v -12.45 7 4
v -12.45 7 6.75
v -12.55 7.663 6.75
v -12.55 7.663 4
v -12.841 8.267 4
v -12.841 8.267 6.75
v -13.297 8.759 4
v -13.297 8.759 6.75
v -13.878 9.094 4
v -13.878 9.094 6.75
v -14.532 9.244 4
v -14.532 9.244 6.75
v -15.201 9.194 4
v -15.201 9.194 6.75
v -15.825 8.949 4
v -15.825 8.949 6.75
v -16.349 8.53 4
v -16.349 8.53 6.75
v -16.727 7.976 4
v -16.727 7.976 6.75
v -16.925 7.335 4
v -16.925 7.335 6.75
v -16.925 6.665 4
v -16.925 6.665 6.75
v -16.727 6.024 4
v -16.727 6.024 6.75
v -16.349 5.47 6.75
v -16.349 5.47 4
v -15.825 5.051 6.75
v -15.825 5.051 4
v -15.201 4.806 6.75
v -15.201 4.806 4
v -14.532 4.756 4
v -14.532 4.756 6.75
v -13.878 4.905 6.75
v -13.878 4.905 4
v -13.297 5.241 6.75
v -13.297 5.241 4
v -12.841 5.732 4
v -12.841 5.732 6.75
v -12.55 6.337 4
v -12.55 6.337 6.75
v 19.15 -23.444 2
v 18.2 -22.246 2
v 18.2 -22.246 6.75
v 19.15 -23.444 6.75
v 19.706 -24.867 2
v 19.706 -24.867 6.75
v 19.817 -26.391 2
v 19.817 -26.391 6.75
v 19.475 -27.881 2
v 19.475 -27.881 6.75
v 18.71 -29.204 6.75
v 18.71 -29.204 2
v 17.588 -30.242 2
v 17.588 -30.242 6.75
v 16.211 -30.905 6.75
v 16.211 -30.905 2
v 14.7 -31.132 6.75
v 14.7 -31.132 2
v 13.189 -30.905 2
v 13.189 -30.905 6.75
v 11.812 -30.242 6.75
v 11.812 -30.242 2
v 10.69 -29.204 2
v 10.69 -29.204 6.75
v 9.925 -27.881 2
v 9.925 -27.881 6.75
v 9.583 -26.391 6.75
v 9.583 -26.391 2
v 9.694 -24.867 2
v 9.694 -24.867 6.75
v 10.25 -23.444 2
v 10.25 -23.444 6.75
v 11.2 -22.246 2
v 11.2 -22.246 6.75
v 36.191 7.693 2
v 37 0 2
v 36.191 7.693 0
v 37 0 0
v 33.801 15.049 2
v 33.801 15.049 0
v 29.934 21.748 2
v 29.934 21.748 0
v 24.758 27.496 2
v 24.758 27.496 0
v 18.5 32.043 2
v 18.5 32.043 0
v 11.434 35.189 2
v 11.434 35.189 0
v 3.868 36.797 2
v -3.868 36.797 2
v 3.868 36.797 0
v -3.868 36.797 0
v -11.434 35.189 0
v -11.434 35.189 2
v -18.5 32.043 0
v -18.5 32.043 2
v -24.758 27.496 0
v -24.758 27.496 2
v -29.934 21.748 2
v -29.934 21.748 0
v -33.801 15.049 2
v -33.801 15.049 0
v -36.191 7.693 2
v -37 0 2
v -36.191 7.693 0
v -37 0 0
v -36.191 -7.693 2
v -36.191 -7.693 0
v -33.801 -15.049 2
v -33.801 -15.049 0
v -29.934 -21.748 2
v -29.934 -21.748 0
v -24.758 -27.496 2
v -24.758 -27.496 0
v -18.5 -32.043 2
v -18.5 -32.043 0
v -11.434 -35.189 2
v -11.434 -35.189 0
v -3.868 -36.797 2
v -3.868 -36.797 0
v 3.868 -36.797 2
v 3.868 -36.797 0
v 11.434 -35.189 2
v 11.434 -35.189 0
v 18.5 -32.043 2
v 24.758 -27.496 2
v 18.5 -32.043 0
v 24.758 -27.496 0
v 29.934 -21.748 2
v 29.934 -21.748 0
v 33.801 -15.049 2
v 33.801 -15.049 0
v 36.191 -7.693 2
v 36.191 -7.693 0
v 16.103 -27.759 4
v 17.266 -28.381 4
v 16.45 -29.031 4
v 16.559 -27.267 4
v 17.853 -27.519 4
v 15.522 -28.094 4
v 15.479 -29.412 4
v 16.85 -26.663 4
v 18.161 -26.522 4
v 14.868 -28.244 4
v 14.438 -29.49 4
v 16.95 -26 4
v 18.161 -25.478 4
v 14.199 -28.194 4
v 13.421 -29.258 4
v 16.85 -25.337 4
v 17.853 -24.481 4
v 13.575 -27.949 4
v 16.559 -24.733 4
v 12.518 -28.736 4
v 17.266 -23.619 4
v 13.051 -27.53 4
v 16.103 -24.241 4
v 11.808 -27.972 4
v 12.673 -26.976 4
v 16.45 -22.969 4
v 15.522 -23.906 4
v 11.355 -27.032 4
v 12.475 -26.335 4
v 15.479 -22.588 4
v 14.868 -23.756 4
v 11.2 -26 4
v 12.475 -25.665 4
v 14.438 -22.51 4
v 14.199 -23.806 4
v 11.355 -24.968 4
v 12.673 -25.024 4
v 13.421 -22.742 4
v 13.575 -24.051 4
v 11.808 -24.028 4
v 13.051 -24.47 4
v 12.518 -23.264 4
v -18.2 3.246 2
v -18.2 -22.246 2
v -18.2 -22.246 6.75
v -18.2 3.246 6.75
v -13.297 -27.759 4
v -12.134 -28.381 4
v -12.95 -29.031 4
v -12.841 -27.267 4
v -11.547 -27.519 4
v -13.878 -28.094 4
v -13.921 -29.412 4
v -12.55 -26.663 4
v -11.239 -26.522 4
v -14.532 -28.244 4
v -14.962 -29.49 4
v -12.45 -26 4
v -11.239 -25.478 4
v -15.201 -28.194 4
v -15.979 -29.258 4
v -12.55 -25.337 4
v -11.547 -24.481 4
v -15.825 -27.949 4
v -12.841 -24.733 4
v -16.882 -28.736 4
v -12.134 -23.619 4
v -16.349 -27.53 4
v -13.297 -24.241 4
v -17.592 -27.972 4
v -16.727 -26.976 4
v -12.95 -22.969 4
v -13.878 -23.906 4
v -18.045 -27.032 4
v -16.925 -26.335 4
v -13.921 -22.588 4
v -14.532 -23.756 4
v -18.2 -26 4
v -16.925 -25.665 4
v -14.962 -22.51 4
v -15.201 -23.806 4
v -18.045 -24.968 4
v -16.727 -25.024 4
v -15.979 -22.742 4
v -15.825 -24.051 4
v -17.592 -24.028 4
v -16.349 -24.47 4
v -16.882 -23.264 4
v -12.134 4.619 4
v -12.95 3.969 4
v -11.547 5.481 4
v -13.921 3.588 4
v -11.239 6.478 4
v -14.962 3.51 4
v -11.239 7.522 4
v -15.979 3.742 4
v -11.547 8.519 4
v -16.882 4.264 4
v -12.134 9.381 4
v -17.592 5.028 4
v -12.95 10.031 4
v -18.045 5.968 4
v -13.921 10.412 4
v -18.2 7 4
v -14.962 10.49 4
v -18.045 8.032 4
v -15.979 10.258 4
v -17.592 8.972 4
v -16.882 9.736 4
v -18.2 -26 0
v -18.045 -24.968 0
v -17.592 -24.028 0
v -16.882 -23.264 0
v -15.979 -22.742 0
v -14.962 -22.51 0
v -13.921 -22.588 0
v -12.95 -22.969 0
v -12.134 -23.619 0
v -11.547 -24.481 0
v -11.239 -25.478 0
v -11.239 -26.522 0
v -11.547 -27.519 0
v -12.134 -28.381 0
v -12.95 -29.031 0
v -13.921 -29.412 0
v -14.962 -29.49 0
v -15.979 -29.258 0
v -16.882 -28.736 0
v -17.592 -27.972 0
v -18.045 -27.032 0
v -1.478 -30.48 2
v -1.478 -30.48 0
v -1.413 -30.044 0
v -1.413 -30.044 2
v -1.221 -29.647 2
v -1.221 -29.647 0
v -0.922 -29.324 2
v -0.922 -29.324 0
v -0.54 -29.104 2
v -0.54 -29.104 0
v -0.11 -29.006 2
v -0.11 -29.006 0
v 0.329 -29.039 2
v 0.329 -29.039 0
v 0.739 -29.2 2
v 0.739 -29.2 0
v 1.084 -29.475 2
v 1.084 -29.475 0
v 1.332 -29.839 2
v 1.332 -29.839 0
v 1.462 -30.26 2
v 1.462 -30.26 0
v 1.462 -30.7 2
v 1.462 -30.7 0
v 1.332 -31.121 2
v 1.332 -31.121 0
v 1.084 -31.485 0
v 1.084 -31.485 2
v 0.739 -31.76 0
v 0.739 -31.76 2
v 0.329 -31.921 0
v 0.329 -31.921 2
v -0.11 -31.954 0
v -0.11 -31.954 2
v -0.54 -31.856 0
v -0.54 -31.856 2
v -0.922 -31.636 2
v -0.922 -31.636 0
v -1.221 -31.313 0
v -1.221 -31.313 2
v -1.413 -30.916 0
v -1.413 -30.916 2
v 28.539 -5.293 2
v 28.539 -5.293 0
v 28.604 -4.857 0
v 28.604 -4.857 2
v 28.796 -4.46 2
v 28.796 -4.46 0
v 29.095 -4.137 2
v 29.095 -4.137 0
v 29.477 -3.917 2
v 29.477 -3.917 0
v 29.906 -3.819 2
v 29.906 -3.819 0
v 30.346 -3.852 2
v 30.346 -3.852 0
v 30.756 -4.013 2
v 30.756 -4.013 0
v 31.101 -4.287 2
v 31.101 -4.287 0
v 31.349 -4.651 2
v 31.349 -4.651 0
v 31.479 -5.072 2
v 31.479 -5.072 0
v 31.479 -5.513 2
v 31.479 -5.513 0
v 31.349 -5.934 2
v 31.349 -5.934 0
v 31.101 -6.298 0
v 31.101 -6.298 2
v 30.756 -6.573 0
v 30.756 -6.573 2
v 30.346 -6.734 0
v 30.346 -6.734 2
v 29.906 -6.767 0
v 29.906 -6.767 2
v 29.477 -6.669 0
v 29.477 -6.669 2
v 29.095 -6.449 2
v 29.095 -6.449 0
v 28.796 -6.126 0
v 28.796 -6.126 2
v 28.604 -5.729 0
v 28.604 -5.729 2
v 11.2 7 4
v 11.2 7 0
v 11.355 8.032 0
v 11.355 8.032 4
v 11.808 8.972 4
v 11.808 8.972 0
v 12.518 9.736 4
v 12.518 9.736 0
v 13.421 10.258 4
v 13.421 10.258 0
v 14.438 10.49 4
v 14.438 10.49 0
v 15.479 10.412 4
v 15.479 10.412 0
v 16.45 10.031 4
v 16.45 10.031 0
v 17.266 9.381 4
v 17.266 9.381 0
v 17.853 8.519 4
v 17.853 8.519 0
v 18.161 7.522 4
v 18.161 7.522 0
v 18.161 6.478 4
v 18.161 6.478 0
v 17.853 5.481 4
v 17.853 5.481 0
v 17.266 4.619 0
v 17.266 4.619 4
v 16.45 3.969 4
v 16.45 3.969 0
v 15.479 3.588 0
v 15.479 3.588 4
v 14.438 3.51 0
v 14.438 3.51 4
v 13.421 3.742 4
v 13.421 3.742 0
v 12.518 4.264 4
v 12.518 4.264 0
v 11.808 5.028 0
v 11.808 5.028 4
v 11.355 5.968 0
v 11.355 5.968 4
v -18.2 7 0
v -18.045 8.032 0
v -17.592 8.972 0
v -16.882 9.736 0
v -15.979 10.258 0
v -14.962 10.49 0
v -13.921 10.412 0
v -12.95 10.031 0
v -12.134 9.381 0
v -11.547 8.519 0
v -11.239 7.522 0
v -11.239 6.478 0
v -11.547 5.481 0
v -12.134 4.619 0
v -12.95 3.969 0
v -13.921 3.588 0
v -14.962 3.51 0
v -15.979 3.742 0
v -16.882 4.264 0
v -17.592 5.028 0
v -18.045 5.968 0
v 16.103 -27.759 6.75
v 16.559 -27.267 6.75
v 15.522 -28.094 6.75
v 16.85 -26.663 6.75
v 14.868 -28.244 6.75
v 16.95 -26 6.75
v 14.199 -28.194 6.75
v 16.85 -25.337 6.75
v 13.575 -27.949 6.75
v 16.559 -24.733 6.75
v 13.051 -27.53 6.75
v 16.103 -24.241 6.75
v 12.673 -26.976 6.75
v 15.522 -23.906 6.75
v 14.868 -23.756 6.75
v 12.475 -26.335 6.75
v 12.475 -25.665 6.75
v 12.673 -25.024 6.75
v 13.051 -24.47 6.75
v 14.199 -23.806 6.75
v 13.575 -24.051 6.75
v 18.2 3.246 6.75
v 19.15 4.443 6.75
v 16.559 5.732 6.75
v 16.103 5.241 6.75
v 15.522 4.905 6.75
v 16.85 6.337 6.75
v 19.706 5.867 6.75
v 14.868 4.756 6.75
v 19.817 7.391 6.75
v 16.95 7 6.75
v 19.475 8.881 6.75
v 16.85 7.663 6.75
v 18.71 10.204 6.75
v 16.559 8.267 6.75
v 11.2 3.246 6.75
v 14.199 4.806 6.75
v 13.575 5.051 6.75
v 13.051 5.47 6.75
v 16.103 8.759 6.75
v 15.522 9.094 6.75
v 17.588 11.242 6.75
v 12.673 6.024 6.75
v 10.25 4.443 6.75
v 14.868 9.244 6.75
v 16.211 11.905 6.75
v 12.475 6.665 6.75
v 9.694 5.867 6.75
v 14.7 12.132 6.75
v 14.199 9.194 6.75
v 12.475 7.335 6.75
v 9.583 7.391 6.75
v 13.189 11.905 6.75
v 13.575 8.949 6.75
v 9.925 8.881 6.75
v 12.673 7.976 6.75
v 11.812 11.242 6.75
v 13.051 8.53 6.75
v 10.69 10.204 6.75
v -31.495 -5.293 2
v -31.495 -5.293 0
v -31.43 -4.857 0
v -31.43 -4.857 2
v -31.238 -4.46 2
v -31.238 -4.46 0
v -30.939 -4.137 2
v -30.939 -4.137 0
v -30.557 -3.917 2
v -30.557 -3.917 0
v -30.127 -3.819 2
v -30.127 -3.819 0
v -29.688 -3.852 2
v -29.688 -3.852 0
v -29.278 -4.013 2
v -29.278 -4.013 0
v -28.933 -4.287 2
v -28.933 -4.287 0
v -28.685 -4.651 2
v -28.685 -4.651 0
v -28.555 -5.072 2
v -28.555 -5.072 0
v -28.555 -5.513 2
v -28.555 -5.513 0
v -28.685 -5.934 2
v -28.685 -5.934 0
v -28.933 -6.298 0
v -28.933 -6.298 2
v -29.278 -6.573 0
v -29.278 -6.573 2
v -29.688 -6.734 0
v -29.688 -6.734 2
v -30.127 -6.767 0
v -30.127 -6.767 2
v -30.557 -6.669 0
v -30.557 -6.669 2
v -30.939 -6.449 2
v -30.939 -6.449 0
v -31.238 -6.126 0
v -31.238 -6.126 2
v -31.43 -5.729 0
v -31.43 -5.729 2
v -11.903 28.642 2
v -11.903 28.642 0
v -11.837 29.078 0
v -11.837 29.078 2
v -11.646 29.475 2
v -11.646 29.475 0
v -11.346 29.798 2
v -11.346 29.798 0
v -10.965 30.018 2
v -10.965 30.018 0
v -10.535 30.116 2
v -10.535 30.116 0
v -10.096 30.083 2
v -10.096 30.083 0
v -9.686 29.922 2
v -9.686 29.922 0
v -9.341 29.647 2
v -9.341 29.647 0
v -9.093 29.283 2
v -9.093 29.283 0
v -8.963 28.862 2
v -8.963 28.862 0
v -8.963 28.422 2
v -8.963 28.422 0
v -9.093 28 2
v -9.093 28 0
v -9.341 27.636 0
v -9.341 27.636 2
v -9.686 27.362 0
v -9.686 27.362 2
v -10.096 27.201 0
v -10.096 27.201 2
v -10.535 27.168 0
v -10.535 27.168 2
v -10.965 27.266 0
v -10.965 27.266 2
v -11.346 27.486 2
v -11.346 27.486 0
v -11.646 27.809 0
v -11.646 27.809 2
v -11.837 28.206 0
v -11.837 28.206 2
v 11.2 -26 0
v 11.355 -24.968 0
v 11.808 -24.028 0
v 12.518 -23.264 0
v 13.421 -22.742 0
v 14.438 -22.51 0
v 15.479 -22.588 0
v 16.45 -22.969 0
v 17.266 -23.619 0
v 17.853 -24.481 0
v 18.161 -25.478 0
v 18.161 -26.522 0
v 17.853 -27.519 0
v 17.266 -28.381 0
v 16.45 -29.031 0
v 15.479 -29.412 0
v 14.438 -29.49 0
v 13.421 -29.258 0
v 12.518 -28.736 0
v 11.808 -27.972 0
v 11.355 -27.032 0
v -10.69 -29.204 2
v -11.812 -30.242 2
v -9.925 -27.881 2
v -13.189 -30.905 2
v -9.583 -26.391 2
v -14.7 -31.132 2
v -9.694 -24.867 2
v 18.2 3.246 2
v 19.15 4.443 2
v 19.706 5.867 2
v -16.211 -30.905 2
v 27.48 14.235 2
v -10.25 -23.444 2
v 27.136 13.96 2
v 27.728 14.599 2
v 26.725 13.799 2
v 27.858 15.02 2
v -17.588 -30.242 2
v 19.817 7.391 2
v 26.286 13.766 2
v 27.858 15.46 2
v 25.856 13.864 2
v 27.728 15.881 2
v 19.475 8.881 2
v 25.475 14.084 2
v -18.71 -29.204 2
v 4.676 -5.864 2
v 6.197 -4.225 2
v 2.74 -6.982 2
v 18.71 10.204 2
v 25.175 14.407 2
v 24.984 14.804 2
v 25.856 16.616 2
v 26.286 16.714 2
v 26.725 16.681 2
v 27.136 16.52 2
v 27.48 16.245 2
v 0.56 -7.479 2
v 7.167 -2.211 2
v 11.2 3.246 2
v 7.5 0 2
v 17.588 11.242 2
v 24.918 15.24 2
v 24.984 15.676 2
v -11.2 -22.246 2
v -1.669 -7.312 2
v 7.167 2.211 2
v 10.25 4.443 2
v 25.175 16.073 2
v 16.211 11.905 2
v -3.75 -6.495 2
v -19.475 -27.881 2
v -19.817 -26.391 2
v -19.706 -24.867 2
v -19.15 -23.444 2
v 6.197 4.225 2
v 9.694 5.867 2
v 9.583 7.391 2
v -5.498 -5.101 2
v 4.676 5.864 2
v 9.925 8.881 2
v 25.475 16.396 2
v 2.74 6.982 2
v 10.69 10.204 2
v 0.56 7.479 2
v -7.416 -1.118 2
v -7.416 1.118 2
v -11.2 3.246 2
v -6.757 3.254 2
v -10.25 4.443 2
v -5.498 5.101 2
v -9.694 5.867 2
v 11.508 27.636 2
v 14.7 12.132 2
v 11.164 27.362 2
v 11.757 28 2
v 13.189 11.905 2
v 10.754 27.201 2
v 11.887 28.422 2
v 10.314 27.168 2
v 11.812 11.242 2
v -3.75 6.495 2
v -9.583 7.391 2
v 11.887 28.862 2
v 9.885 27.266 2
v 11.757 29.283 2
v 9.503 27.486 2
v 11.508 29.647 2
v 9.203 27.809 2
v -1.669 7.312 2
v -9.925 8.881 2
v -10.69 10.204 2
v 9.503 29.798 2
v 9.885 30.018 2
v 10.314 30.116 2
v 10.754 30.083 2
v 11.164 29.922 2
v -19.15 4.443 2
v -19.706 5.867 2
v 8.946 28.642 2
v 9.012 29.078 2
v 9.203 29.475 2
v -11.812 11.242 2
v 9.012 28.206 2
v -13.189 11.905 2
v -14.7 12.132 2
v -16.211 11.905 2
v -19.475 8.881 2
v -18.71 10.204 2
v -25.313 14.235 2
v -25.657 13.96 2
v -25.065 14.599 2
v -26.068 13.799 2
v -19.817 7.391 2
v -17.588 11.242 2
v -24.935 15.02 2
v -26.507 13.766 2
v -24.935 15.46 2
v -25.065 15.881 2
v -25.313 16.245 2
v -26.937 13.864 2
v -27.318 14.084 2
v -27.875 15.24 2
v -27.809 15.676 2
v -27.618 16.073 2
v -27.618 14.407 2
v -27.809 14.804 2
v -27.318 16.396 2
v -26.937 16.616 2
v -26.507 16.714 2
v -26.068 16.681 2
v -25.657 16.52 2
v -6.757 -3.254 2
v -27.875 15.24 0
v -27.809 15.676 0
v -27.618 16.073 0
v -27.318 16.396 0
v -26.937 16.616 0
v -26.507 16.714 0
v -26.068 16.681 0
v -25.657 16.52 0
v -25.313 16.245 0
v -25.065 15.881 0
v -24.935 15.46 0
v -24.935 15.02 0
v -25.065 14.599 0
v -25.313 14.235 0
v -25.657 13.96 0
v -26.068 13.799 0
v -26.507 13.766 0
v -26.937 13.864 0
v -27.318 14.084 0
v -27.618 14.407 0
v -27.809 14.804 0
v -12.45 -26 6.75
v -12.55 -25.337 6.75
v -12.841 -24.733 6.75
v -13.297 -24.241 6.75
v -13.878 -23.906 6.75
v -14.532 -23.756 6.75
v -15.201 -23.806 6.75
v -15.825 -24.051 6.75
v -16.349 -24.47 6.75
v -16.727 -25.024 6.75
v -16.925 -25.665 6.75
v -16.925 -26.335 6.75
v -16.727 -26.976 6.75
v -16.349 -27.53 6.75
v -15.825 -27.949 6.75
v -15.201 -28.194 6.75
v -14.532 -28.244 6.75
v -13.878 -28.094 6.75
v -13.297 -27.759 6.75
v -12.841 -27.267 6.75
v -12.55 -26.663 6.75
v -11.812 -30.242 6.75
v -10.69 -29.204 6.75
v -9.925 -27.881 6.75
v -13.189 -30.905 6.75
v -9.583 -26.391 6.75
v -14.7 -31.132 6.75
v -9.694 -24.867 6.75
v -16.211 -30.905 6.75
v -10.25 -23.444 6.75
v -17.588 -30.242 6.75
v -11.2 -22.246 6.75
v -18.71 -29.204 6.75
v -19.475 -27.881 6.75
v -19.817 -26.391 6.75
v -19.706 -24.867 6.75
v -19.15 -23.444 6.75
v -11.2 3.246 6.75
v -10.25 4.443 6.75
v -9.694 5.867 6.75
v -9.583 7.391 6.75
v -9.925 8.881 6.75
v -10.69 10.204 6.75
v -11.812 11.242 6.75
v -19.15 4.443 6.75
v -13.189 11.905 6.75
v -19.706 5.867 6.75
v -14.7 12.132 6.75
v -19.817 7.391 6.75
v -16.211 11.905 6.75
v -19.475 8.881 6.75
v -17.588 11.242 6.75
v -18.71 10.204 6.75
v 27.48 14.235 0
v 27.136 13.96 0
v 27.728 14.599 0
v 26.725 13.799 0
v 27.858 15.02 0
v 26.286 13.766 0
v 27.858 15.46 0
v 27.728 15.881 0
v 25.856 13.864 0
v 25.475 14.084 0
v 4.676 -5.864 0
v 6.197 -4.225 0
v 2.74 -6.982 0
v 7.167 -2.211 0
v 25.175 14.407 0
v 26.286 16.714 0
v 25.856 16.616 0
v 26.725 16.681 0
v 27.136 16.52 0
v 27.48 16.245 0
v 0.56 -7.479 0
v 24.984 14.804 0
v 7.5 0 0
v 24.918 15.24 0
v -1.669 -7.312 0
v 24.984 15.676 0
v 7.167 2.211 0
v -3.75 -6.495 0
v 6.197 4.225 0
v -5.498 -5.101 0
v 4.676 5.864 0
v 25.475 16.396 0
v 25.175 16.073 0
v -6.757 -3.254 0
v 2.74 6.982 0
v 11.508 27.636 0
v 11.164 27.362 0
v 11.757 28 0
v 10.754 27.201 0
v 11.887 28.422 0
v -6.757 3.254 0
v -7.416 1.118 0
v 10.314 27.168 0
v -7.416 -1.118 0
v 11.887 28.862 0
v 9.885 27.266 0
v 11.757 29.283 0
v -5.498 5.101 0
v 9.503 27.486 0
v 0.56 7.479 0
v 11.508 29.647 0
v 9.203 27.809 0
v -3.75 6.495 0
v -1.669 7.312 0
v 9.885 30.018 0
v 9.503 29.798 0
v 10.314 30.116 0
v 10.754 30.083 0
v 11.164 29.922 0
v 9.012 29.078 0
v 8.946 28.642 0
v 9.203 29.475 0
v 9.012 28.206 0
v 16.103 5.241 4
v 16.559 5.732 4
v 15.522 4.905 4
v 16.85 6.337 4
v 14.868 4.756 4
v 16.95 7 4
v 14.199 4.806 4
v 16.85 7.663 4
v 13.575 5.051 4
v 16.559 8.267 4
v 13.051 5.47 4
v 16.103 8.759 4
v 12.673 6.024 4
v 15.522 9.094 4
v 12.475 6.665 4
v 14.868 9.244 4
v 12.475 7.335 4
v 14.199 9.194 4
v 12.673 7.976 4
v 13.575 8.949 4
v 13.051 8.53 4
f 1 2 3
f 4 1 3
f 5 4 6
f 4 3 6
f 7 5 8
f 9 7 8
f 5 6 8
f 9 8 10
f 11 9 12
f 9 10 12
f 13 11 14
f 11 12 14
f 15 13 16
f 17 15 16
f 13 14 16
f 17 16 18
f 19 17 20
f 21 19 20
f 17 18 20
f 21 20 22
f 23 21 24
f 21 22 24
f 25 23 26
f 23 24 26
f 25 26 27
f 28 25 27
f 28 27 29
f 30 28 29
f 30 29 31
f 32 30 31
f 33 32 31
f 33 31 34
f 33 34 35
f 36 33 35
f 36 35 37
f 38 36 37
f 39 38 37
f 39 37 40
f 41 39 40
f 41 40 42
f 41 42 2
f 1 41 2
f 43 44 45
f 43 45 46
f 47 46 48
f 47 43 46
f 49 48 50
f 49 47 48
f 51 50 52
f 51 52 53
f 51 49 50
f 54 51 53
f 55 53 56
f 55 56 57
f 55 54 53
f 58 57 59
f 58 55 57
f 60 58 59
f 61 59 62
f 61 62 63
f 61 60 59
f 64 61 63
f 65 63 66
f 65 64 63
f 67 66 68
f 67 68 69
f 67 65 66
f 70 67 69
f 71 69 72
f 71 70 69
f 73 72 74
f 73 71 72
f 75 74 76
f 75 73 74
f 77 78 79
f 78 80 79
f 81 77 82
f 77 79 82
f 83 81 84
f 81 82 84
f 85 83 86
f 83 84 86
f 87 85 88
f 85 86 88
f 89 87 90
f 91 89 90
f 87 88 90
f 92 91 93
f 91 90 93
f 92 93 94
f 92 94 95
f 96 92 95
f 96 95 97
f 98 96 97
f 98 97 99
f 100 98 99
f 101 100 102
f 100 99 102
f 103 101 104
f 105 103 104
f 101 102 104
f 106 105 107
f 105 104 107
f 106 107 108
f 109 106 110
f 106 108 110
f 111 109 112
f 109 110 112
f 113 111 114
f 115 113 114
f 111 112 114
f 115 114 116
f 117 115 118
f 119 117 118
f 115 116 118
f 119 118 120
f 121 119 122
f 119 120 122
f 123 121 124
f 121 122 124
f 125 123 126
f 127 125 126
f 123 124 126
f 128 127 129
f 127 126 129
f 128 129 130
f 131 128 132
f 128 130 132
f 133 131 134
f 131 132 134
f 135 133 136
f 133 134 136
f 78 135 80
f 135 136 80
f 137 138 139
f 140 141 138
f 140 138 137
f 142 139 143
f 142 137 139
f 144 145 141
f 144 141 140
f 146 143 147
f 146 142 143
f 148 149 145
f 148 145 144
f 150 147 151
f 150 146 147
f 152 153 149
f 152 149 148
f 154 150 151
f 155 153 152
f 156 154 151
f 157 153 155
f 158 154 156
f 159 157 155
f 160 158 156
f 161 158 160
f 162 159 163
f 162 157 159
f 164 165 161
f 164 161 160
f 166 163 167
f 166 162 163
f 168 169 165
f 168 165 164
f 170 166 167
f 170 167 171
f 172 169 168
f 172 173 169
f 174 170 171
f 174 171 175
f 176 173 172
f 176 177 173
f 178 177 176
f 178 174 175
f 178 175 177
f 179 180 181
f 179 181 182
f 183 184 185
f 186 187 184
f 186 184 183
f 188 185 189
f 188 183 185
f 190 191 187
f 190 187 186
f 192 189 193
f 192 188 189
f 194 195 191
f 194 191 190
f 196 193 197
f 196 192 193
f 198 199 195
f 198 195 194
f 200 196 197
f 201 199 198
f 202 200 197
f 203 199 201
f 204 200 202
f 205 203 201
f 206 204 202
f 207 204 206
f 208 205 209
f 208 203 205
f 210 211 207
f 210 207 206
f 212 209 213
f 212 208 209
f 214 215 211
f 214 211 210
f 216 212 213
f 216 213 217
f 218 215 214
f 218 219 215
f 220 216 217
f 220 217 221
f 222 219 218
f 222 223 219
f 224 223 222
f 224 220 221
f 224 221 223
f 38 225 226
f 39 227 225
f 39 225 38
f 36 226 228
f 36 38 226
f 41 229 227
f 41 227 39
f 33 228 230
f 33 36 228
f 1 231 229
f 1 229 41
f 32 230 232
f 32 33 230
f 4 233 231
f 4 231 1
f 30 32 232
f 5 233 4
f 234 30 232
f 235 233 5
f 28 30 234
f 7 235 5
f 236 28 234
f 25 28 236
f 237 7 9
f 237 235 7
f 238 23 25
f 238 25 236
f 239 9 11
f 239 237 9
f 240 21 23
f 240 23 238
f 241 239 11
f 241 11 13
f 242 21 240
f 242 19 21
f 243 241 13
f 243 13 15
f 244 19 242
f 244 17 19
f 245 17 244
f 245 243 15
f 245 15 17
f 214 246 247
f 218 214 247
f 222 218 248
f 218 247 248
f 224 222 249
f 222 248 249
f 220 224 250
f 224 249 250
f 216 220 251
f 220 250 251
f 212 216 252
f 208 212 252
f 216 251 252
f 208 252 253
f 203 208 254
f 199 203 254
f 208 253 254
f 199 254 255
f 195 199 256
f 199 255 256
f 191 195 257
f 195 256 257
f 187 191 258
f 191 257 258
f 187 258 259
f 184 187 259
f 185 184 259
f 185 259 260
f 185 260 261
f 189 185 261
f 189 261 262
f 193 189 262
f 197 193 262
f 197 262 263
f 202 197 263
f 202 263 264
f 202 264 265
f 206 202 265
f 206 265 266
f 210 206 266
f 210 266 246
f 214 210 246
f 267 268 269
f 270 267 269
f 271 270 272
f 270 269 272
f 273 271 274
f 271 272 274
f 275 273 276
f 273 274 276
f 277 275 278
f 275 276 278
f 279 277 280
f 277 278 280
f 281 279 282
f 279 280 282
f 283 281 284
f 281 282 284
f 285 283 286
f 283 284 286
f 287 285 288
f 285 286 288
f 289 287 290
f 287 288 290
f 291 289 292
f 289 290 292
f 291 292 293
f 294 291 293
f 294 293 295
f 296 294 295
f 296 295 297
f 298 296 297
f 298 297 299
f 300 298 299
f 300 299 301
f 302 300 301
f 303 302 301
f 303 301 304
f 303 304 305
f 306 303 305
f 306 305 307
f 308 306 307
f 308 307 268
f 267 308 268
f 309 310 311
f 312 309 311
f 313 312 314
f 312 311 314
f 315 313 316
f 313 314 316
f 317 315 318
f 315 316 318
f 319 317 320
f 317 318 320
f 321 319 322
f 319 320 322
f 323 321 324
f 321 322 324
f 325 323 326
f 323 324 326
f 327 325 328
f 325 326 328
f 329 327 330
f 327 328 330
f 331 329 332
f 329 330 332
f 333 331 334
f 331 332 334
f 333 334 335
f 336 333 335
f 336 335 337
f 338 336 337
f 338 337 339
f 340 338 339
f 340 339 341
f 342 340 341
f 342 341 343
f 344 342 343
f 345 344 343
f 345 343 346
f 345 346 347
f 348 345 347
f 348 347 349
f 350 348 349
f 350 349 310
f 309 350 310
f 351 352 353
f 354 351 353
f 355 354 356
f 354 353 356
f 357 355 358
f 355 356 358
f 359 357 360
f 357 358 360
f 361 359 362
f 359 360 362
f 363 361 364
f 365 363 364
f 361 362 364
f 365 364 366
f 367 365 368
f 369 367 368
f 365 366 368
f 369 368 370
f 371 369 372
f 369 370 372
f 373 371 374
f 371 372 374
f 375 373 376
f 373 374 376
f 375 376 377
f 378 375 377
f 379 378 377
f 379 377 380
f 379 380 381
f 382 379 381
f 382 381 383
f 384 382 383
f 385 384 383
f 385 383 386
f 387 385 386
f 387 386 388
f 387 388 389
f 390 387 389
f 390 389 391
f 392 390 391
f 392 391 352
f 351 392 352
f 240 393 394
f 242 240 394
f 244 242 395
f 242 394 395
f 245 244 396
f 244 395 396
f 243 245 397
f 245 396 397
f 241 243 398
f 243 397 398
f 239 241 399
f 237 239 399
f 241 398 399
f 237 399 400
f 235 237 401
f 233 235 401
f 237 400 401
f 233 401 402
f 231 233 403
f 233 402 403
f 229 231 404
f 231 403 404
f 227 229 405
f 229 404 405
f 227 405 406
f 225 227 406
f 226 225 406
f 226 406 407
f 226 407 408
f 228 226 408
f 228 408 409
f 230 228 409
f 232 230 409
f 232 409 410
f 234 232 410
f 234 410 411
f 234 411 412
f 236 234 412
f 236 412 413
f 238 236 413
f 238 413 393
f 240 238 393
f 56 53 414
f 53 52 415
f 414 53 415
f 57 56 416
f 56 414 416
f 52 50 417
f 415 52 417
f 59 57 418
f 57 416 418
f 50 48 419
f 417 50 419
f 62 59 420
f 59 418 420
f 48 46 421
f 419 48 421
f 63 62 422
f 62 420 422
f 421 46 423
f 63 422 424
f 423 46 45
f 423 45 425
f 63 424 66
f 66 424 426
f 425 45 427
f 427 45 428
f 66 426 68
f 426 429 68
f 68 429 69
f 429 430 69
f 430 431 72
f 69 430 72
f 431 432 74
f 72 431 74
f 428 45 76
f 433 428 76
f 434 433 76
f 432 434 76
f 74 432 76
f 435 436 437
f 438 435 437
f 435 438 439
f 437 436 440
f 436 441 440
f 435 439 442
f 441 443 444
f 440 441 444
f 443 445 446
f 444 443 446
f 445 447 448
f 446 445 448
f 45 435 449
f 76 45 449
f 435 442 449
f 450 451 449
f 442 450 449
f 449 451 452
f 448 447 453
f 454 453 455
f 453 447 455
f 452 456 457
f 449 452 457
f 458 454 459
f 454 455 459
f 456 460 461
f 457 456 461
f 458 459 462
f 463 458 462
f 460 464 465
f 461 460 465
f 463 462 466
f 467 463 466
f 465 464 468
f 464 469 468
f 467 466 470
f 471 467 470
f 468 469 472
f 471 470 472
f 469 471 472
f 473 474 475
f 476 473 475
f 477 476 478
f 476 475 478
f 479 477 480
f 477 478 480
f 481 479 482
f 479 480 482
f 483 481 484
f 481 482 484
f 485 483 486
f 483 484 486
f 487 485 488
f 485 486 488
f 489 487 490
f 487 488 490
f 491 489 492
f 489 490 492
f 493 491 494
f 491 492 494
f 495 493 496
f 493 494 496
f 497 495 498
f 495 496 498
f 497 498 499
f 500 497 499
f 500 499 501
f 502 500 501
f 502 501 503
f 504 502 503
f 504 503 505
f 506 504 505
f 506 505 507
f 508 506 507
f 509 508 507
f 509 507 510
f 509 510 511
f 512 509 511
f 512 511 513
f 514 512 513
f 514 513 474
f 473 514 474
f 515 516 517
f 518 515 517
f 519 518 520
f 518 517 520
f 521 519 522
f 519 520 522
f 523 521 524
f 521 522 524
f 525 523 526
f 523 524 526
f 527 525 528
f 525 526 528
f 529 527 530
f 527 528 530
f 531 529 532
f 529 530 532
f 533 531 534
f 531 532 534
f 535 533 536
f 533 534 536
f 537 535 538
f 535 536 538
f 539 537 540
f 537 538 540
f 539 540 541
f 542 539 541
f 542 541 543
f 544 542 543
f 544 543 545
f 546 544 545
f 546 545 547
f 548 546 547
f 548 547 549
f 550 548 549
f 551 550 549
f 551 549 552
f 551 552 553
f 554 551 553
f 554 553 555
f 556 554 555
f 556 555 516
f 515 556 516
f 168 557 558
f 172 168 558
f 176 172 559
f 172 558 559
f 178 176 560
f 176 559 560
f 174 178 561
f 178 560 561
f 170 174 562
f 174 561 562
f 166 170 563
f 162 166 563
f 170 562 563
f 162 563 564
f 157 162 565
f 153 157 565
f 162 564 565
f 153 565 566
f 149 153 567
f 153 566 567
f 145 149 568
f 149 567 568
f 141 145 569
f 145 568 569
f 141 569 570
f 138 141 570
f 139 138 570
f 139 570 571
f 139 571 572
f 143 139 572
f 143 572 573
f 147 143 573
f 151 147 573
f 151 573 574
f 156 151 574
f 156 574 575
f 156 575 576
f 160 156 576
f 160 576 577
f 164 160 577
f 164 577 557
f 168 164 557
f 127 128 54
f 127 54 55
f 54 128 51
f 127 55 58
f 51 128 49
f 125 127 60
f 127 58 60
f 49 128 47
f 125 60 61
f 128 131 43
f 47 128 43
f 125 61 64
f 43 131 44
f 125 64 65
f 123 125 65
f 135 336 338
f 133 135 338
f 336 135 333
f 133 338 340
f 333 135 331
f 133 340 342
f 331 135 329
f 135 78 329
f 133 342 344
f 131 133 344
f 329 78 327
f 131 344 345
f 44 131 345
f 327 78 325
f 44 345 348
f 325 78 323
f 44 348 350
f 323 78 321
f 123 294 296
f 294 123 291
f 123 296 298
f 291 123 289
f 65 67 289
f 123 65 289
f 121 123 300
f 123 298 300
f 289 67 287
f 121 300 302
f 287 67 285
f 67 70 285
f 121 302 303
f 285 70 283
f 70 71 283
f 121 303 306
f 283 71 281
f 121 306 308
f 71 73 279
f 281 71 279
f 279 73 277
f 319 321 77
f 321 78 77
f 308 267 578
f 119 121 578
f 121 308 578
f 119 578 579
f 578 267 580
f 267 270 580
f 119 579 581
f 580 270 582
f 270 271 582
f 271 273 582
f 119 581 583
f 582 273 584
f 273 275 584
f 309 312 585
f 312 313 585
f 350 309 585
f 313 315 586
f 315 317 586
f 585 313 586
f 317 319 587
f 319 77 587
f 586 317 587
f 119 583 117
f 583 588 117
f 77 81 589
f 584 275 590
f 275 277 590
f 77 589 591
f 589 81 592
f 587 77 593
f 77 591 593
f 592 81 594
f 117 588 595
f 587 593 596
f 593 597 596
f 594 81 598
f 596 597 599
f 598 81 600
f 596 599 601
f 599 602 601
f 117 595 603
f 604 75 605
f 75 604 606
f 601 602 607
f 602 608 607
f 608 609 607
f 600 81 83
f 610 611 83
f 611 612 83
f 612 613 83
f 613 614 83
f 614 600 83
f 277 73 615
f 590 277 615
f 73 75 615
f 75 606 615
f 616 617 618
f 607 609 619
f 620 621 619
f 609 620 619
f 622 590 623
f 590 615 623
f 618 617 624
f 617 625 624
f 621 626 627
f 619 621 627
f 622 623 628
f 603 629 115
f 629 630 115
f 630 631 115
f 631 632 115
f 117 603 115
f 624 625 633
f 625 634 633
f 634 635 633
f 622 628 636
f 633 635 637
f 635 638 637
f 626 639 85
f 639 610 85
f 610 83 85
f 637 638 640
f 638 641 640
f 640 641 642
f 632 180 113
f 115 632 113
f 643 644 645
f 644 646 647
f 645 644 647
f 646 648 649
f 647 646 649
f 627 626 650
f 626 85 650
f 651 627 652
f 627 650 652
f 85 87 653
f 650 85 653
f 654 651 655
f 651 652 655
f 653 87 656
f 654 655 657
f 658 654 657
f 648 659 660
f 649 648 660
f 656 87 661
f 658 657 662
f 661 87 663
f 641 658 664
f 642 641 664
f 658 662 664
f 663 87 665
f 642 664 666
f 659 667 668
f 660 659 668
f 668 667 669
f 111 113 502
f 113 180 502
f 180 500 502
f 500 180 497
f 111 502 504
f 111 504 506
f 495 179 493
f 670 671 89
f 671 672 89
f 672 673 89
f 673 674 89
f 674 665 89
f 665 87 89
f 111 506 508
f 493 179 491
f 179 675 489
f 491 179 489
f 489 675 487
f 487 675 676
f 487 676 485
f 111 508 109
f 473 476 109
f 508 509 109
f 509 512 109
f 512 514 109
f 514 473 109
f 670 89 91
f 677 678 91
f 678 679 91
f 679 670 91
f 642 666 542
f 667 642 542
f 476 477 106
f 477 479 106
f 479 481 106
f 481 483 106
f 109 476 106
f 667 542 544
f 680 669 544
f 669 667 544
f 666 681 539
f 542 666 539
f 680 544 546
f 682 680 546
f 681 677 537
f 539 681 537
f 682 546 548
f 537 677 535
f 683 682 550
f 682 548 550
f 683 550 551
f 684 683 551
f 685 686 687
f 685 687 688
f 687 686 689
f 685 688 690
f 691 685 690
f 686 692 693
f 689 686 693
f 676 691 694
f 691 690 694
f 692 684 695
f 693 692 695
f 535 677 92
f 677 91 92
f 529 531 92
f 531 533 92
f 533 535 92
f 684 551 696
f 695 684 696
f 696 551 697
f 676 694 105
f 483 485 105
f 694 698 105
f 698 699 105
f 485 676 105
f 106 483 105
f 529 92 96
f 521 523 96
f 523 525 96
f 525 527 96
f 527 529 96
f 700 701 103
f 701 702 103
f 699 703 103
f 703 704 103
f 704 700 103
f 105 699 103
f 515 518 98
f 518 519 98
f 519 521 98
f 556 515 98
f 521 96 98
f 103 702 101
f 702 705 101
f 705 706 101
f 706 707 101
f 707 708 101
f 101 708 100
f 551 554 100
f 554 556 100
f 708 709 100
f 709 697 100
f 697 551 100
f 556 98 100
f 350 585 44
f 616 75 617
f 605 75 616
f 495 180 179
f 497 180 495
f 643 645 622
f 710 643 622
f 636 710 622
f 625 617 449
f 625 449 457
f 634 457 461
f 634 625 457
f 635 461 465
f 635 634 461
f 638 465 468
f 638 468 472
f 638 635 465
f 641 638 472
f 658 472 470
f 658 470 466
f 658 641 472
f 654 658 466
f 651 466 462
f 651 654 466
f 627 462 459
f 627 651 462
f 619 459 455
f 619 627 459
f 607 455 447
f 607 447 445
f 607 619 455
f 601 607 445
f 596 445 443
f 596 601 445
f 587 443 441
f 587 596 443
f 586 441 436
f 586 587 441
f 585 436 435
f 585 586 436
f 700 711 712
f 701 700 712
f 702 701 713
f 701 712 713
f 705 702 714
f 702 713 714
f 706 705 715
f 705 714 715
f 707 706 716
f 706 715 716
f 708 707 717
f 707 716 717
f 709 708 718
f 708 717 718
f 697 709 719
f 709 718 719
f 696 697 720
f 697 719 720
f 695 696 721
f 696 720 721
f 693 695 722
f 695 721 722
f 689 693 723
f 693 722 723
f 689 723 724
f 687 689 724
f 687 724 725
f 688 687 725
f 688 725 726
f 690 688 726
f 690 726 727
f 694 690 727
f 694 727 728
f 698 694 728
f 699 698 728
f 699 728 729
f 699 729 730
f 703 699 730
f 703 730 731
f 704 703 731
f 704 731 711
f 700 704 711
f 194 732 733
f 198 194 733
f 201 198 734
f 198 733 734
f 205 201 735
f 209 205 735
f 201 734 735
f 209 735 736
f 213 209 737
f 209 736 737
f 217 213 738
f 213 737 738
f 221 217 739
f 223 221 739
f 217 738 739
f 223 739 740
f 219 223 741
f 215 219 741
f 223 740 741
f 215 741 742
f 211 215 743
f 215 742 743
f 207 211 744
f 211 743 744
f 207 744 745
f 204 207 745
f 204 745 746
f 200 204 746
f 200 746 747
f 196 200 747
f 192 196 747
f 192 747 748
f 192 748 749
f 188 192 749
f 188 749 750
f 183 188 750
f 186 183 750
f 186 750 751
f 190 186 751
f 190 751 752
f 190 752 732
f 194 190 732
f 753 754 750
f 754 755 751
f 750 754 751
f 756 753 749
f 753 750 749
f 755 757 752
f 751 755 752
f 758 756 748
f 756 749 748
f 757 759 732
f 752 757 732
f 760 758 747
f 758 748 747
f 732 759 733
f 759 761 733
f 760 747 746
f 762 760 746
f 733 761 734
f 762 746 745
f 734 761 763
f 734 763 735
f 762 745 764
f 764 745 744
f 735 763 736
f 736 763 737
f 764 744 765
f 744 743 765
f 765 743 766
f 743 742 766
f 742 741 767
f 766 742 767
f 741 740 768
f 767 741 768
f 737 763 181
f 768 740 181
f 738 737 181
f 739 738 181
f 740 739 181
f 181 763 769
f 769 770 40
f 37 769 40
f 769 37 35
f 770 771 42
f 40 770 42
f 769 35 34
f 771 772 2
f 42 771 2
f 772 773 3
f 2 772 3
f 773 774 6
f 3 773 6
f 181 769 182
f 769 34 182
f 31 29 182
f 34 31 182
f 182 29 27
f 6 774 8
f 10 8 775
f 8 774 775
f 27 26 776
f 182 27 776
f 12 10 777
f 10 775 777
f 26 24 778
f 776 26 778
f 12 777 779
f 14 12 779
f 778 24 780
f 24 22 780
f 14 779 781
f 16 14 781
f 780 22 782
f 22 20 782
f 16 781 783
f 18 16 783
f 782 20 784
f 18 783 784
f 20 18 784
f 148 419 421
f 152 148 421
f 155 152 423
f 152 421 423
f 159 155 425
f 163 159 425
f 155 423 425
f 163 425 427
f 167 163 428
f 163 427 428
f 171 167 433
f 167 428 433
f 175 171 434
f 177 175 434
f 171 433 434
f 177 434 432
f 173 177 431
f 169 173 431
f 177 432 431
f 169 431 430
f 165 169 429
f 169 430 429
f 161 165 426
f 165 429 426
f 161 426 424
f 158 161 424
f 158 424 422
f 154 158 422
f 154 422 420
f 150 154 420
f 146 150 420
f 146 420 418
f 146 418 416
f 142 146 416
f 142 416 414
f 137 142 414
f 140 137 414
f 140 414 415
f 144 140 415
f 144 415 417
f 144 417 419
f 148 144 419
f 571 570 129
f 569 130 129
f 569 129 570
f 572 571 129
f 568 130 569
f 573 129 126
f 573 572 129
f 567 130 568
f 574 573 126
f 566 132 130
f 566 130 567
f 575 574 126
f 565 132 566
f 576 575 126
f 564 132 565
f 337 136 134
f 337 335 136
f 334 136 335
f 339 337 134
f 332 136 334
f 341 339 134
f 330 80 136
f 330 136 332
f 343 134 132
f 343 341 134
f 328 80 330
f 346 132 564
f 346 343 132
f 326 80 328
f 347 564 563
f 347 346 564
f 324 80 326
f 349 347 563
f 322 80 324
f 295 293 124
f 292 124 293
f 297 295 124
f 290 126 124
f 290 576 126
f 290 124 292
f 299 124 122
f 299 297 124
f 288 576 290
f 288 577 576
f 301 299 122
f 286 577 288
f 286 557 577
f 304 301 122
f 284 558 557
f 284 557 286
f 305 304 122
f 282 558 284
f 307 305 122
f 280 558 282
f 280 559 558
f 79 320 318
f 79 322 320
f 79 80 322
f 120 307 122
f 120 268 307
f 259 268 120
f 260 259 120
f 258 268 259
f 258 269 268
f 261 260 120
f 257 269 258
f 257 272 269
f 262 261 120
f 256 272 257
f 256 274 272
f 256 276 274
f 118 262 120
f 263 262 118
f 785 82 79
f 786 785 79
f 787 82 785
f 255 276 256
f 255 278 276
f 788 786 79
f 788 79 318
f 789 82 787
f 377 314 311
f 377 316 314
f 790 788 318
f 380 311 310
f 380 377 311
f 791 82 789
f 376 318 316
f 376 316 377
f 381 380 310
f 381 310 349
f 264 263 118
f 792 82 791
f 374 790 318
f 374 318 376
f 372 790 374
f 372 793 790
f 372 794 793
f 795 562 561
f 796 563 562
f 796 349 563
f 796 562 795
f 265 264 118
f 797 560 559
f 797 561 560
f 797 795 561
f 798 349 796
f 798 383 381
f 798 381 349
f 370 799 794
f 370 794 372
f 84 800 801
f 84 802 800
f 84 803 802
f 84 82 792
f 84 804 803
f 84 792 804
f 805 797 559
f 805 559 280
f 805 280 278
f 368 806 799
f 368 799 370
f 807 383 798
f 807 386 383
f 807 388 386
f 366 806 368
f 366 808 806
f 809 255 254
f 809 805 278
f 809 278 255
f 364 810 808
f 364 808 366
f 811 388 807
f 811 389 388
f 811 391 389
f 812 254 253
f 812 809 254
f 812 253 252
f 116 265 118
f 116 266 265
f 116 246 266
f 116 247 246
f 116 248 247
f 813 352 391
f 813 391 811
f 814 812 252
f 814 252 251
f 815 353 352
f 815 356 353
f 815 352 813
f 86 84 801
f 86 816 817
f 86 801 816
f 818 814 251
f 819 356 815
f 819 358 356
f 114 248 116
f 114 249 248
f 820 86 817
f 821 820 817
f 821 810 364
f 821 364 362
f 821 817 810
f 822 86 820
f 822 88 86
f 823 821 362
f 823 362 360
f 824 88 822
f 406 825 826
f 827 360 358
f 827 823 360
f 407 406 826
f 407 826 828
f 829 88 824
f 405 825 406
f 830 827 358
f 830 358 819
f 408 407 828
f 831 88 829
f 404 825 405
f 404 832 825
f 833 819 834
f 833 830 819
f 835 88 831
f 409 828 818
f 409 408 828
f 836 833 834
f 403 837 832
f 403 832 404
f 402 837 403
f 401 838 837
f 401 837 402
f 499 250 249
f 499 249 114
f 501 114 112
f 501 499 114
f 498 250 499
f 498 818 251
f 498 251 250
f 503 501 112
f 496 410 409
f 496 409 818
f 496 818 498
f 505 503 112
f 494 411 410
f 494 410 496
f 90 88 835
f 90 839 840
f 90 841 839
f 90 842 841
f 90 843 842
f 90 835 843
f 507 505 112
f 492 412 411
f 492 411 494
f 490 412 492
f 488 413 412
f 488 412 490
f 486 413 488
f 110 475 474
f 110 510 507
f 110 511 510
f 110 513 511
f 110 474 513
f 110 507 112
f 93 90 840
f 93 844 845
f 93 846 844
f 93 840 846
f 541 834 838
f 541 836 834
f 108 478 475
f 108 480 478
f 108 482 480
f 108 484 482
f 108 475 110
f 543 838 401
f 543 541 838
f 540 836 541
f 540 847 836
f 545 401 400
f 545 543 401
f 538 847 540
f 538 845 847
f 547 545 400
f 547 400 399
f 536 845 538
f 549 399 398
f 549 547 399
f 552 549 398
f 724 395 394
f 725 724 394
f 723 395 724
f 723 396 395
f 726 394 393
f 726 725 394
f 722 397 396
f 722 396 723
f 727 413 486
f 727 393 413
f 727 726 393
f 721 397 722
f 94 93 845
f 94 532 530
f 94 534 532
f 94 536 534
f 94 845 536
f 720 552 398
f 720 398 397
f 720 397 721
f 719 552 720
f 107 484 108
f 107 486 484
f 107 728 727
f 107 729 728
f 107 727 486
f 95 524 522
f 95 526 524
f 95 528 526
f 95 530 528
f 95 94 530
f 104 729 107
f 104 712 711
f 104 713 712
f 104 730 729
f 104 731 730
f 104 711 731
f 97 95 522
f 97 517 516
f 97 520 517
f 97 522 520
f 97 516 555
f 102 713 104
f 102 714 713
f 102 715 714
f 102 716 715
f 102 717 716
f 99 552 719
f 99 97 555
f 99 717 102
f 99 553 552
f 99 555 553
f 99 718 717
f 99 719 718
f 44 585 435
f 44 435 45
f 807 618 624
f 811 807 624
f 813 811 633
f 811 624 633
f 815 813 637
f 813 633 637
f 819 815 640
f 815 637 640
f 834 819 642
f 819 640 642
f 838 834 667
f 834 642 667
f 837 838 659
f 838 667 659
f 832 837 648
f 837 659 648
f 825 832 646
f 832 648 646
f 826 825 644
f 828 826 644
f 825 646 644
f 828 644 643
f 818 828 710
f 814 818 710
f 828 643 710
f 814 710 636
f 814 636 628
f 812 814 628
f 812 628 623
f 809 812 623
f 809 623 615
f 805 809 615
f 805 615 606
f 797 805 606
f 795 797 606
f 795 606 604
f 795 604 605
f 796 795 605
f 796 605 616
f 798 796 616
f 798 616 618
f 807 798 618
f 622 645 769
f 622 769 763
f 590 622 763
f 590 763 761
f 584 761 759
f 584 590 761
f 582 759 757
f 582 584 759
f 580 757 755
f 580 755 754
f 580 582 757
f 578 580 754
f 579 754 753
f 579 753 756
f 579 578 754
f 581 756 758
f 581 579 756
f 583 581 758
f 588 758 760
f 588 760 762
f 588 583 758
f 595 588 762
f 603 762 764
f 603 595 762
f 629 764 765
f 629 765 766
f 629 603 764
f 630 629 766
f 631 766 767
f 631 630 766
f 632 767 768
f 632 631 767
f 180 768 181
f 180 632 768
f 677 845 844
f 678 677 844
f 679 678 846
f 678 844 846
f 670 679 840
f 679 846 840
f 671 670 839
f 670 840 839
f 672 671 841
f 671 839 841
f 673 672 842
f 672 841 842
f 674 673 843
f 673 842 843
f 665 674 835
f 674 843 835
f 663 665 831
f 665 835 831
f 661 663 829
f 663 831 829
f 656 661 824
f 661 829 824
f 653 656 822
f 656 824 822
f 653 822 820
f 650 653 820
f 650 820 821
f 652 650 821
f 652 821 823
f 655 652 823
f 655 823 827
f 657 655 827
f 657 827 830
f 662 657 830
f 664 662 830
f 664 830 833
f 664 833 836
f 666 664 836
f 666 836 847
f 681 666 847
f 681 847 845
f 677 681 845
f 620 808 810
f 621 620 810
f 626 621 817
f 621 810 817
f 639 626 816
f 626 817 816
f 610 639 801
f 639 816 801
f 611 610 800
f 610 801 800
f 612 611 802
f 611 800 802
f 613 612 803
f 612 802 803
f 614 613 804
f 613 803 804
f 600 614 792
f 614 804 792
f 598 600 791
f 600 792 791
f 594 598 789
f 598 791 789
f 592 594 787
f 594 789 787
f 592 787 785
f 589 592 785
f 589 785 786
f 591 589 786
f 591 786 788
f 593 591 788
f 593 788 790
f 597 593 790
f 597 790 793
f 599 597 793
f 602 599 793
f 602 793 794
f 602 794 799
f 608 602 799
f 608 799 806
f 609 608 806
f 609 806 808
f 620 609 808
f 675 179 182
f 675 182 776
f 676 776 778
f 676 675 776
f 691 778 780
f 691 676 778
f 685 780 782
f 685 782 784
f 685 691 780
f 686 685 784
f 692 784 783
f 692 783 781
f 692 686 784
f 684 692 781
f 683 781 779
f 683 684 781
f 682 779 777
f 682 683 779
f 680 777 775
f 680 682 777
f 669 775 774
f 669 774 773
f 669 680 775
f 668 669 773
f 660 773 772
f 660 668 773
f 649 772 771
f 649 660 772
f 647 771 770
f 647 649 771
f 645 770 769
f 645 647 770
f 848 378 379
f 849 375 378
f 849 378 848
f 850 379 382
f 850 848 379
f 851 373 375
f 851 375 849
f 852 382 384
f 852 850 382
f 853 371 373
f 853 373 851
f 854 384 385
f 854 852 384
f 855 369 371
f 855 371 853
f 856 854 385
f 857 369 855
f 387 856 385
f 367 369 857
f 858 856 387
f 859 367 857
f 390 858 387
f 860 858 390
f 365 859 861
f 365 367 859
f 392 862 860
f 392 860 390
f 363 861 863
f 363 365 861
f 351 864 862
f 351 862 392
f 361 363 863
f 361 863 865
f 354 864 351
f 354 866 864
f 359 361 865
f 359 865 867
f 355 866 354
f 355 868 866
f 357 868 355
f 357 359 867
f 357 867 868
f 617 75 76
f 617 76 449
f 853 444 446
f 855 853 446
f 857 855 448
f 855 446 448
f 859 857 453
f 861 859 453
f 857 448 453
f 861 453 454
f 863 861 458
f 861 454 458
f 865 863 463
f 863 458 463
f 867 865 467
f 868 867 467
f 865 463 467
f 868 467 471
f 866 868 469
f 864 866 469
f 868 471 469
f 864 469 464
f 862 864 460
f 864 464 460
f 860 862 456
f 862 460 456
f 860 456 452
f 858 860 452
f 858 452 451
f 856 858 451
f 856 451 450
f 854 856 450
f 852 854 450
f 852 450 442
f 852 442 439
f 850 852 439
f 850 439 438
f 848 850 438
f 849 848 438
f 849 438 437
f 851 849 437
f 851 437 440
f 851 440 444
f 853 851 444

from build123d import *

# Parameters (mm, degrees)
IZIM1_W                          = 37
IZIM1_H                          = 2
Y_KSEKLIK_EKSTR_ZYON1_DEPTH      = 4.75
Y_KSEKLIK_EKSTR_ZYON2_DEPTH      = 4.75
DELIK1_D                         = 2.95656
DELIK1_DEPTH                     = 2
F_0_15_0_15_DIAMETER_HOLE1_D     = 15
F_0_15_0_15_DIAMETER_HOLE1_DEPTH = 6.75
M7X1_0_TAPPED_HOLE1_D            = 4.5
M7X1_0_TAPPED_HOLE1_DEPTH        = 6.75
M7X1_0_TAPPED_HOLE1_CBORE_D      = 7
M7X1_0_TAPPED_HOLE1_CBORE_DEPTH  = 4


with BuildPart() as part:
    # Çizim1 → Döndür1 (revolve)
    with BuildSketch(Plane(origin=(0, 0, 0), x_dir=(1, 0, 0), z_dir=(0, 1, 0))):
        with Locations((18.5, -1)):
            Rectangle(IZIM1_W, IZIM1_H)
    revolve(axis=Axis((0, 0, 0), (0, 0, 1)))

    # Çizim2 → Yükseklik-Ekstrüzyon1 (add)
    with BuildSketch(Plane.XY.offset(2)):
        with BuildLine():
            Line((-18.2, -22.246481648), (-18.2, 3.246418008))
            ThreePointArc((-18.2, 3.246418008), (-14.7, 12.132116892), (-11.2, 3.246418008))
            Line((-11.2, 3.246418008), (-11.2, -22.246481648))
            ThreePointArc((-11.2, -22.246481648), (-14.7, -31.132180531), (-18.2, -22.246481648))
        make_face()
    extrude(amount=Y_KSEKLIK_EKSTR_ZYON1_DEPTH)

    # Çizim3 → Yükseklik-Ekstrüzyon2 (add)
    with BuildSketch(Plane.XY.offset(2)):
        with BuildLine():
            Line((18.2, 3.246418008), (18.2, -22.246481648))
            ThreePointArc((18.2, -22.246481648), (14.7, -31.132180531), (11.2, -22.246481648))
            Line((11.2, -22.246481648), (11.2, 3.246418008))
            ThreePointArc((11.2, 3.246418008), (14.7, 12.132116892), (18.2, 3.246418008))
        make_face()
    extrude(amount=Y_KSEKLIK_EKSTR_ZYON2_DEPTH)

    # Delik1
    with Locations(Plane.XY.offset(2)):
        with Locations((-30.016940312, -5.292796455), (-26.396454307, 15.24), (-10.424773969, 28.641831082), (10.424773969, 28.641831082), (26.396454307, 15.24), (30.016940312, -5.292796455), (0, -30.48)):
            Hole(DELIK1_D / 2, depth=DELIK1_DEPTH)

    # Ø0.15 (0.15) Diameter Hole1
    with Locations(Plane(origin=(0, 0, 0), x_dir=(-1, 0, 0), z_dir=(0, 0, -1))):
        with Locations((0, 0)):
            Hole(F_0_15_0_15_DIAMETER_HOLE1_D / 2, depth=F_0_15_0_15_DIAMETER_HOLE1_DEPTH)

    # M7x1.0 Tapped Hole1
    with Locations(Plane(origin=(0, 0, 0), x_dir=(-1, 0, 0), z_dir=(0, 0, -1))):
        with Locations((14.7, -26), (-14.7, 6.999957574), (-14.7, -26), (14.7, 6.999957574)):
            CounterBoreHole(M7X1_0_TAPPED_HOLE1_D / 2, M7X1_0_TAPPED_HOLE1_CBORE_D / 2, M7X1_0_TAPPED_HOLE1_CBORE_DEPTH, depth=M7X1_0_TAPPED_HOLE1_DEPTH)


solid = part.part
